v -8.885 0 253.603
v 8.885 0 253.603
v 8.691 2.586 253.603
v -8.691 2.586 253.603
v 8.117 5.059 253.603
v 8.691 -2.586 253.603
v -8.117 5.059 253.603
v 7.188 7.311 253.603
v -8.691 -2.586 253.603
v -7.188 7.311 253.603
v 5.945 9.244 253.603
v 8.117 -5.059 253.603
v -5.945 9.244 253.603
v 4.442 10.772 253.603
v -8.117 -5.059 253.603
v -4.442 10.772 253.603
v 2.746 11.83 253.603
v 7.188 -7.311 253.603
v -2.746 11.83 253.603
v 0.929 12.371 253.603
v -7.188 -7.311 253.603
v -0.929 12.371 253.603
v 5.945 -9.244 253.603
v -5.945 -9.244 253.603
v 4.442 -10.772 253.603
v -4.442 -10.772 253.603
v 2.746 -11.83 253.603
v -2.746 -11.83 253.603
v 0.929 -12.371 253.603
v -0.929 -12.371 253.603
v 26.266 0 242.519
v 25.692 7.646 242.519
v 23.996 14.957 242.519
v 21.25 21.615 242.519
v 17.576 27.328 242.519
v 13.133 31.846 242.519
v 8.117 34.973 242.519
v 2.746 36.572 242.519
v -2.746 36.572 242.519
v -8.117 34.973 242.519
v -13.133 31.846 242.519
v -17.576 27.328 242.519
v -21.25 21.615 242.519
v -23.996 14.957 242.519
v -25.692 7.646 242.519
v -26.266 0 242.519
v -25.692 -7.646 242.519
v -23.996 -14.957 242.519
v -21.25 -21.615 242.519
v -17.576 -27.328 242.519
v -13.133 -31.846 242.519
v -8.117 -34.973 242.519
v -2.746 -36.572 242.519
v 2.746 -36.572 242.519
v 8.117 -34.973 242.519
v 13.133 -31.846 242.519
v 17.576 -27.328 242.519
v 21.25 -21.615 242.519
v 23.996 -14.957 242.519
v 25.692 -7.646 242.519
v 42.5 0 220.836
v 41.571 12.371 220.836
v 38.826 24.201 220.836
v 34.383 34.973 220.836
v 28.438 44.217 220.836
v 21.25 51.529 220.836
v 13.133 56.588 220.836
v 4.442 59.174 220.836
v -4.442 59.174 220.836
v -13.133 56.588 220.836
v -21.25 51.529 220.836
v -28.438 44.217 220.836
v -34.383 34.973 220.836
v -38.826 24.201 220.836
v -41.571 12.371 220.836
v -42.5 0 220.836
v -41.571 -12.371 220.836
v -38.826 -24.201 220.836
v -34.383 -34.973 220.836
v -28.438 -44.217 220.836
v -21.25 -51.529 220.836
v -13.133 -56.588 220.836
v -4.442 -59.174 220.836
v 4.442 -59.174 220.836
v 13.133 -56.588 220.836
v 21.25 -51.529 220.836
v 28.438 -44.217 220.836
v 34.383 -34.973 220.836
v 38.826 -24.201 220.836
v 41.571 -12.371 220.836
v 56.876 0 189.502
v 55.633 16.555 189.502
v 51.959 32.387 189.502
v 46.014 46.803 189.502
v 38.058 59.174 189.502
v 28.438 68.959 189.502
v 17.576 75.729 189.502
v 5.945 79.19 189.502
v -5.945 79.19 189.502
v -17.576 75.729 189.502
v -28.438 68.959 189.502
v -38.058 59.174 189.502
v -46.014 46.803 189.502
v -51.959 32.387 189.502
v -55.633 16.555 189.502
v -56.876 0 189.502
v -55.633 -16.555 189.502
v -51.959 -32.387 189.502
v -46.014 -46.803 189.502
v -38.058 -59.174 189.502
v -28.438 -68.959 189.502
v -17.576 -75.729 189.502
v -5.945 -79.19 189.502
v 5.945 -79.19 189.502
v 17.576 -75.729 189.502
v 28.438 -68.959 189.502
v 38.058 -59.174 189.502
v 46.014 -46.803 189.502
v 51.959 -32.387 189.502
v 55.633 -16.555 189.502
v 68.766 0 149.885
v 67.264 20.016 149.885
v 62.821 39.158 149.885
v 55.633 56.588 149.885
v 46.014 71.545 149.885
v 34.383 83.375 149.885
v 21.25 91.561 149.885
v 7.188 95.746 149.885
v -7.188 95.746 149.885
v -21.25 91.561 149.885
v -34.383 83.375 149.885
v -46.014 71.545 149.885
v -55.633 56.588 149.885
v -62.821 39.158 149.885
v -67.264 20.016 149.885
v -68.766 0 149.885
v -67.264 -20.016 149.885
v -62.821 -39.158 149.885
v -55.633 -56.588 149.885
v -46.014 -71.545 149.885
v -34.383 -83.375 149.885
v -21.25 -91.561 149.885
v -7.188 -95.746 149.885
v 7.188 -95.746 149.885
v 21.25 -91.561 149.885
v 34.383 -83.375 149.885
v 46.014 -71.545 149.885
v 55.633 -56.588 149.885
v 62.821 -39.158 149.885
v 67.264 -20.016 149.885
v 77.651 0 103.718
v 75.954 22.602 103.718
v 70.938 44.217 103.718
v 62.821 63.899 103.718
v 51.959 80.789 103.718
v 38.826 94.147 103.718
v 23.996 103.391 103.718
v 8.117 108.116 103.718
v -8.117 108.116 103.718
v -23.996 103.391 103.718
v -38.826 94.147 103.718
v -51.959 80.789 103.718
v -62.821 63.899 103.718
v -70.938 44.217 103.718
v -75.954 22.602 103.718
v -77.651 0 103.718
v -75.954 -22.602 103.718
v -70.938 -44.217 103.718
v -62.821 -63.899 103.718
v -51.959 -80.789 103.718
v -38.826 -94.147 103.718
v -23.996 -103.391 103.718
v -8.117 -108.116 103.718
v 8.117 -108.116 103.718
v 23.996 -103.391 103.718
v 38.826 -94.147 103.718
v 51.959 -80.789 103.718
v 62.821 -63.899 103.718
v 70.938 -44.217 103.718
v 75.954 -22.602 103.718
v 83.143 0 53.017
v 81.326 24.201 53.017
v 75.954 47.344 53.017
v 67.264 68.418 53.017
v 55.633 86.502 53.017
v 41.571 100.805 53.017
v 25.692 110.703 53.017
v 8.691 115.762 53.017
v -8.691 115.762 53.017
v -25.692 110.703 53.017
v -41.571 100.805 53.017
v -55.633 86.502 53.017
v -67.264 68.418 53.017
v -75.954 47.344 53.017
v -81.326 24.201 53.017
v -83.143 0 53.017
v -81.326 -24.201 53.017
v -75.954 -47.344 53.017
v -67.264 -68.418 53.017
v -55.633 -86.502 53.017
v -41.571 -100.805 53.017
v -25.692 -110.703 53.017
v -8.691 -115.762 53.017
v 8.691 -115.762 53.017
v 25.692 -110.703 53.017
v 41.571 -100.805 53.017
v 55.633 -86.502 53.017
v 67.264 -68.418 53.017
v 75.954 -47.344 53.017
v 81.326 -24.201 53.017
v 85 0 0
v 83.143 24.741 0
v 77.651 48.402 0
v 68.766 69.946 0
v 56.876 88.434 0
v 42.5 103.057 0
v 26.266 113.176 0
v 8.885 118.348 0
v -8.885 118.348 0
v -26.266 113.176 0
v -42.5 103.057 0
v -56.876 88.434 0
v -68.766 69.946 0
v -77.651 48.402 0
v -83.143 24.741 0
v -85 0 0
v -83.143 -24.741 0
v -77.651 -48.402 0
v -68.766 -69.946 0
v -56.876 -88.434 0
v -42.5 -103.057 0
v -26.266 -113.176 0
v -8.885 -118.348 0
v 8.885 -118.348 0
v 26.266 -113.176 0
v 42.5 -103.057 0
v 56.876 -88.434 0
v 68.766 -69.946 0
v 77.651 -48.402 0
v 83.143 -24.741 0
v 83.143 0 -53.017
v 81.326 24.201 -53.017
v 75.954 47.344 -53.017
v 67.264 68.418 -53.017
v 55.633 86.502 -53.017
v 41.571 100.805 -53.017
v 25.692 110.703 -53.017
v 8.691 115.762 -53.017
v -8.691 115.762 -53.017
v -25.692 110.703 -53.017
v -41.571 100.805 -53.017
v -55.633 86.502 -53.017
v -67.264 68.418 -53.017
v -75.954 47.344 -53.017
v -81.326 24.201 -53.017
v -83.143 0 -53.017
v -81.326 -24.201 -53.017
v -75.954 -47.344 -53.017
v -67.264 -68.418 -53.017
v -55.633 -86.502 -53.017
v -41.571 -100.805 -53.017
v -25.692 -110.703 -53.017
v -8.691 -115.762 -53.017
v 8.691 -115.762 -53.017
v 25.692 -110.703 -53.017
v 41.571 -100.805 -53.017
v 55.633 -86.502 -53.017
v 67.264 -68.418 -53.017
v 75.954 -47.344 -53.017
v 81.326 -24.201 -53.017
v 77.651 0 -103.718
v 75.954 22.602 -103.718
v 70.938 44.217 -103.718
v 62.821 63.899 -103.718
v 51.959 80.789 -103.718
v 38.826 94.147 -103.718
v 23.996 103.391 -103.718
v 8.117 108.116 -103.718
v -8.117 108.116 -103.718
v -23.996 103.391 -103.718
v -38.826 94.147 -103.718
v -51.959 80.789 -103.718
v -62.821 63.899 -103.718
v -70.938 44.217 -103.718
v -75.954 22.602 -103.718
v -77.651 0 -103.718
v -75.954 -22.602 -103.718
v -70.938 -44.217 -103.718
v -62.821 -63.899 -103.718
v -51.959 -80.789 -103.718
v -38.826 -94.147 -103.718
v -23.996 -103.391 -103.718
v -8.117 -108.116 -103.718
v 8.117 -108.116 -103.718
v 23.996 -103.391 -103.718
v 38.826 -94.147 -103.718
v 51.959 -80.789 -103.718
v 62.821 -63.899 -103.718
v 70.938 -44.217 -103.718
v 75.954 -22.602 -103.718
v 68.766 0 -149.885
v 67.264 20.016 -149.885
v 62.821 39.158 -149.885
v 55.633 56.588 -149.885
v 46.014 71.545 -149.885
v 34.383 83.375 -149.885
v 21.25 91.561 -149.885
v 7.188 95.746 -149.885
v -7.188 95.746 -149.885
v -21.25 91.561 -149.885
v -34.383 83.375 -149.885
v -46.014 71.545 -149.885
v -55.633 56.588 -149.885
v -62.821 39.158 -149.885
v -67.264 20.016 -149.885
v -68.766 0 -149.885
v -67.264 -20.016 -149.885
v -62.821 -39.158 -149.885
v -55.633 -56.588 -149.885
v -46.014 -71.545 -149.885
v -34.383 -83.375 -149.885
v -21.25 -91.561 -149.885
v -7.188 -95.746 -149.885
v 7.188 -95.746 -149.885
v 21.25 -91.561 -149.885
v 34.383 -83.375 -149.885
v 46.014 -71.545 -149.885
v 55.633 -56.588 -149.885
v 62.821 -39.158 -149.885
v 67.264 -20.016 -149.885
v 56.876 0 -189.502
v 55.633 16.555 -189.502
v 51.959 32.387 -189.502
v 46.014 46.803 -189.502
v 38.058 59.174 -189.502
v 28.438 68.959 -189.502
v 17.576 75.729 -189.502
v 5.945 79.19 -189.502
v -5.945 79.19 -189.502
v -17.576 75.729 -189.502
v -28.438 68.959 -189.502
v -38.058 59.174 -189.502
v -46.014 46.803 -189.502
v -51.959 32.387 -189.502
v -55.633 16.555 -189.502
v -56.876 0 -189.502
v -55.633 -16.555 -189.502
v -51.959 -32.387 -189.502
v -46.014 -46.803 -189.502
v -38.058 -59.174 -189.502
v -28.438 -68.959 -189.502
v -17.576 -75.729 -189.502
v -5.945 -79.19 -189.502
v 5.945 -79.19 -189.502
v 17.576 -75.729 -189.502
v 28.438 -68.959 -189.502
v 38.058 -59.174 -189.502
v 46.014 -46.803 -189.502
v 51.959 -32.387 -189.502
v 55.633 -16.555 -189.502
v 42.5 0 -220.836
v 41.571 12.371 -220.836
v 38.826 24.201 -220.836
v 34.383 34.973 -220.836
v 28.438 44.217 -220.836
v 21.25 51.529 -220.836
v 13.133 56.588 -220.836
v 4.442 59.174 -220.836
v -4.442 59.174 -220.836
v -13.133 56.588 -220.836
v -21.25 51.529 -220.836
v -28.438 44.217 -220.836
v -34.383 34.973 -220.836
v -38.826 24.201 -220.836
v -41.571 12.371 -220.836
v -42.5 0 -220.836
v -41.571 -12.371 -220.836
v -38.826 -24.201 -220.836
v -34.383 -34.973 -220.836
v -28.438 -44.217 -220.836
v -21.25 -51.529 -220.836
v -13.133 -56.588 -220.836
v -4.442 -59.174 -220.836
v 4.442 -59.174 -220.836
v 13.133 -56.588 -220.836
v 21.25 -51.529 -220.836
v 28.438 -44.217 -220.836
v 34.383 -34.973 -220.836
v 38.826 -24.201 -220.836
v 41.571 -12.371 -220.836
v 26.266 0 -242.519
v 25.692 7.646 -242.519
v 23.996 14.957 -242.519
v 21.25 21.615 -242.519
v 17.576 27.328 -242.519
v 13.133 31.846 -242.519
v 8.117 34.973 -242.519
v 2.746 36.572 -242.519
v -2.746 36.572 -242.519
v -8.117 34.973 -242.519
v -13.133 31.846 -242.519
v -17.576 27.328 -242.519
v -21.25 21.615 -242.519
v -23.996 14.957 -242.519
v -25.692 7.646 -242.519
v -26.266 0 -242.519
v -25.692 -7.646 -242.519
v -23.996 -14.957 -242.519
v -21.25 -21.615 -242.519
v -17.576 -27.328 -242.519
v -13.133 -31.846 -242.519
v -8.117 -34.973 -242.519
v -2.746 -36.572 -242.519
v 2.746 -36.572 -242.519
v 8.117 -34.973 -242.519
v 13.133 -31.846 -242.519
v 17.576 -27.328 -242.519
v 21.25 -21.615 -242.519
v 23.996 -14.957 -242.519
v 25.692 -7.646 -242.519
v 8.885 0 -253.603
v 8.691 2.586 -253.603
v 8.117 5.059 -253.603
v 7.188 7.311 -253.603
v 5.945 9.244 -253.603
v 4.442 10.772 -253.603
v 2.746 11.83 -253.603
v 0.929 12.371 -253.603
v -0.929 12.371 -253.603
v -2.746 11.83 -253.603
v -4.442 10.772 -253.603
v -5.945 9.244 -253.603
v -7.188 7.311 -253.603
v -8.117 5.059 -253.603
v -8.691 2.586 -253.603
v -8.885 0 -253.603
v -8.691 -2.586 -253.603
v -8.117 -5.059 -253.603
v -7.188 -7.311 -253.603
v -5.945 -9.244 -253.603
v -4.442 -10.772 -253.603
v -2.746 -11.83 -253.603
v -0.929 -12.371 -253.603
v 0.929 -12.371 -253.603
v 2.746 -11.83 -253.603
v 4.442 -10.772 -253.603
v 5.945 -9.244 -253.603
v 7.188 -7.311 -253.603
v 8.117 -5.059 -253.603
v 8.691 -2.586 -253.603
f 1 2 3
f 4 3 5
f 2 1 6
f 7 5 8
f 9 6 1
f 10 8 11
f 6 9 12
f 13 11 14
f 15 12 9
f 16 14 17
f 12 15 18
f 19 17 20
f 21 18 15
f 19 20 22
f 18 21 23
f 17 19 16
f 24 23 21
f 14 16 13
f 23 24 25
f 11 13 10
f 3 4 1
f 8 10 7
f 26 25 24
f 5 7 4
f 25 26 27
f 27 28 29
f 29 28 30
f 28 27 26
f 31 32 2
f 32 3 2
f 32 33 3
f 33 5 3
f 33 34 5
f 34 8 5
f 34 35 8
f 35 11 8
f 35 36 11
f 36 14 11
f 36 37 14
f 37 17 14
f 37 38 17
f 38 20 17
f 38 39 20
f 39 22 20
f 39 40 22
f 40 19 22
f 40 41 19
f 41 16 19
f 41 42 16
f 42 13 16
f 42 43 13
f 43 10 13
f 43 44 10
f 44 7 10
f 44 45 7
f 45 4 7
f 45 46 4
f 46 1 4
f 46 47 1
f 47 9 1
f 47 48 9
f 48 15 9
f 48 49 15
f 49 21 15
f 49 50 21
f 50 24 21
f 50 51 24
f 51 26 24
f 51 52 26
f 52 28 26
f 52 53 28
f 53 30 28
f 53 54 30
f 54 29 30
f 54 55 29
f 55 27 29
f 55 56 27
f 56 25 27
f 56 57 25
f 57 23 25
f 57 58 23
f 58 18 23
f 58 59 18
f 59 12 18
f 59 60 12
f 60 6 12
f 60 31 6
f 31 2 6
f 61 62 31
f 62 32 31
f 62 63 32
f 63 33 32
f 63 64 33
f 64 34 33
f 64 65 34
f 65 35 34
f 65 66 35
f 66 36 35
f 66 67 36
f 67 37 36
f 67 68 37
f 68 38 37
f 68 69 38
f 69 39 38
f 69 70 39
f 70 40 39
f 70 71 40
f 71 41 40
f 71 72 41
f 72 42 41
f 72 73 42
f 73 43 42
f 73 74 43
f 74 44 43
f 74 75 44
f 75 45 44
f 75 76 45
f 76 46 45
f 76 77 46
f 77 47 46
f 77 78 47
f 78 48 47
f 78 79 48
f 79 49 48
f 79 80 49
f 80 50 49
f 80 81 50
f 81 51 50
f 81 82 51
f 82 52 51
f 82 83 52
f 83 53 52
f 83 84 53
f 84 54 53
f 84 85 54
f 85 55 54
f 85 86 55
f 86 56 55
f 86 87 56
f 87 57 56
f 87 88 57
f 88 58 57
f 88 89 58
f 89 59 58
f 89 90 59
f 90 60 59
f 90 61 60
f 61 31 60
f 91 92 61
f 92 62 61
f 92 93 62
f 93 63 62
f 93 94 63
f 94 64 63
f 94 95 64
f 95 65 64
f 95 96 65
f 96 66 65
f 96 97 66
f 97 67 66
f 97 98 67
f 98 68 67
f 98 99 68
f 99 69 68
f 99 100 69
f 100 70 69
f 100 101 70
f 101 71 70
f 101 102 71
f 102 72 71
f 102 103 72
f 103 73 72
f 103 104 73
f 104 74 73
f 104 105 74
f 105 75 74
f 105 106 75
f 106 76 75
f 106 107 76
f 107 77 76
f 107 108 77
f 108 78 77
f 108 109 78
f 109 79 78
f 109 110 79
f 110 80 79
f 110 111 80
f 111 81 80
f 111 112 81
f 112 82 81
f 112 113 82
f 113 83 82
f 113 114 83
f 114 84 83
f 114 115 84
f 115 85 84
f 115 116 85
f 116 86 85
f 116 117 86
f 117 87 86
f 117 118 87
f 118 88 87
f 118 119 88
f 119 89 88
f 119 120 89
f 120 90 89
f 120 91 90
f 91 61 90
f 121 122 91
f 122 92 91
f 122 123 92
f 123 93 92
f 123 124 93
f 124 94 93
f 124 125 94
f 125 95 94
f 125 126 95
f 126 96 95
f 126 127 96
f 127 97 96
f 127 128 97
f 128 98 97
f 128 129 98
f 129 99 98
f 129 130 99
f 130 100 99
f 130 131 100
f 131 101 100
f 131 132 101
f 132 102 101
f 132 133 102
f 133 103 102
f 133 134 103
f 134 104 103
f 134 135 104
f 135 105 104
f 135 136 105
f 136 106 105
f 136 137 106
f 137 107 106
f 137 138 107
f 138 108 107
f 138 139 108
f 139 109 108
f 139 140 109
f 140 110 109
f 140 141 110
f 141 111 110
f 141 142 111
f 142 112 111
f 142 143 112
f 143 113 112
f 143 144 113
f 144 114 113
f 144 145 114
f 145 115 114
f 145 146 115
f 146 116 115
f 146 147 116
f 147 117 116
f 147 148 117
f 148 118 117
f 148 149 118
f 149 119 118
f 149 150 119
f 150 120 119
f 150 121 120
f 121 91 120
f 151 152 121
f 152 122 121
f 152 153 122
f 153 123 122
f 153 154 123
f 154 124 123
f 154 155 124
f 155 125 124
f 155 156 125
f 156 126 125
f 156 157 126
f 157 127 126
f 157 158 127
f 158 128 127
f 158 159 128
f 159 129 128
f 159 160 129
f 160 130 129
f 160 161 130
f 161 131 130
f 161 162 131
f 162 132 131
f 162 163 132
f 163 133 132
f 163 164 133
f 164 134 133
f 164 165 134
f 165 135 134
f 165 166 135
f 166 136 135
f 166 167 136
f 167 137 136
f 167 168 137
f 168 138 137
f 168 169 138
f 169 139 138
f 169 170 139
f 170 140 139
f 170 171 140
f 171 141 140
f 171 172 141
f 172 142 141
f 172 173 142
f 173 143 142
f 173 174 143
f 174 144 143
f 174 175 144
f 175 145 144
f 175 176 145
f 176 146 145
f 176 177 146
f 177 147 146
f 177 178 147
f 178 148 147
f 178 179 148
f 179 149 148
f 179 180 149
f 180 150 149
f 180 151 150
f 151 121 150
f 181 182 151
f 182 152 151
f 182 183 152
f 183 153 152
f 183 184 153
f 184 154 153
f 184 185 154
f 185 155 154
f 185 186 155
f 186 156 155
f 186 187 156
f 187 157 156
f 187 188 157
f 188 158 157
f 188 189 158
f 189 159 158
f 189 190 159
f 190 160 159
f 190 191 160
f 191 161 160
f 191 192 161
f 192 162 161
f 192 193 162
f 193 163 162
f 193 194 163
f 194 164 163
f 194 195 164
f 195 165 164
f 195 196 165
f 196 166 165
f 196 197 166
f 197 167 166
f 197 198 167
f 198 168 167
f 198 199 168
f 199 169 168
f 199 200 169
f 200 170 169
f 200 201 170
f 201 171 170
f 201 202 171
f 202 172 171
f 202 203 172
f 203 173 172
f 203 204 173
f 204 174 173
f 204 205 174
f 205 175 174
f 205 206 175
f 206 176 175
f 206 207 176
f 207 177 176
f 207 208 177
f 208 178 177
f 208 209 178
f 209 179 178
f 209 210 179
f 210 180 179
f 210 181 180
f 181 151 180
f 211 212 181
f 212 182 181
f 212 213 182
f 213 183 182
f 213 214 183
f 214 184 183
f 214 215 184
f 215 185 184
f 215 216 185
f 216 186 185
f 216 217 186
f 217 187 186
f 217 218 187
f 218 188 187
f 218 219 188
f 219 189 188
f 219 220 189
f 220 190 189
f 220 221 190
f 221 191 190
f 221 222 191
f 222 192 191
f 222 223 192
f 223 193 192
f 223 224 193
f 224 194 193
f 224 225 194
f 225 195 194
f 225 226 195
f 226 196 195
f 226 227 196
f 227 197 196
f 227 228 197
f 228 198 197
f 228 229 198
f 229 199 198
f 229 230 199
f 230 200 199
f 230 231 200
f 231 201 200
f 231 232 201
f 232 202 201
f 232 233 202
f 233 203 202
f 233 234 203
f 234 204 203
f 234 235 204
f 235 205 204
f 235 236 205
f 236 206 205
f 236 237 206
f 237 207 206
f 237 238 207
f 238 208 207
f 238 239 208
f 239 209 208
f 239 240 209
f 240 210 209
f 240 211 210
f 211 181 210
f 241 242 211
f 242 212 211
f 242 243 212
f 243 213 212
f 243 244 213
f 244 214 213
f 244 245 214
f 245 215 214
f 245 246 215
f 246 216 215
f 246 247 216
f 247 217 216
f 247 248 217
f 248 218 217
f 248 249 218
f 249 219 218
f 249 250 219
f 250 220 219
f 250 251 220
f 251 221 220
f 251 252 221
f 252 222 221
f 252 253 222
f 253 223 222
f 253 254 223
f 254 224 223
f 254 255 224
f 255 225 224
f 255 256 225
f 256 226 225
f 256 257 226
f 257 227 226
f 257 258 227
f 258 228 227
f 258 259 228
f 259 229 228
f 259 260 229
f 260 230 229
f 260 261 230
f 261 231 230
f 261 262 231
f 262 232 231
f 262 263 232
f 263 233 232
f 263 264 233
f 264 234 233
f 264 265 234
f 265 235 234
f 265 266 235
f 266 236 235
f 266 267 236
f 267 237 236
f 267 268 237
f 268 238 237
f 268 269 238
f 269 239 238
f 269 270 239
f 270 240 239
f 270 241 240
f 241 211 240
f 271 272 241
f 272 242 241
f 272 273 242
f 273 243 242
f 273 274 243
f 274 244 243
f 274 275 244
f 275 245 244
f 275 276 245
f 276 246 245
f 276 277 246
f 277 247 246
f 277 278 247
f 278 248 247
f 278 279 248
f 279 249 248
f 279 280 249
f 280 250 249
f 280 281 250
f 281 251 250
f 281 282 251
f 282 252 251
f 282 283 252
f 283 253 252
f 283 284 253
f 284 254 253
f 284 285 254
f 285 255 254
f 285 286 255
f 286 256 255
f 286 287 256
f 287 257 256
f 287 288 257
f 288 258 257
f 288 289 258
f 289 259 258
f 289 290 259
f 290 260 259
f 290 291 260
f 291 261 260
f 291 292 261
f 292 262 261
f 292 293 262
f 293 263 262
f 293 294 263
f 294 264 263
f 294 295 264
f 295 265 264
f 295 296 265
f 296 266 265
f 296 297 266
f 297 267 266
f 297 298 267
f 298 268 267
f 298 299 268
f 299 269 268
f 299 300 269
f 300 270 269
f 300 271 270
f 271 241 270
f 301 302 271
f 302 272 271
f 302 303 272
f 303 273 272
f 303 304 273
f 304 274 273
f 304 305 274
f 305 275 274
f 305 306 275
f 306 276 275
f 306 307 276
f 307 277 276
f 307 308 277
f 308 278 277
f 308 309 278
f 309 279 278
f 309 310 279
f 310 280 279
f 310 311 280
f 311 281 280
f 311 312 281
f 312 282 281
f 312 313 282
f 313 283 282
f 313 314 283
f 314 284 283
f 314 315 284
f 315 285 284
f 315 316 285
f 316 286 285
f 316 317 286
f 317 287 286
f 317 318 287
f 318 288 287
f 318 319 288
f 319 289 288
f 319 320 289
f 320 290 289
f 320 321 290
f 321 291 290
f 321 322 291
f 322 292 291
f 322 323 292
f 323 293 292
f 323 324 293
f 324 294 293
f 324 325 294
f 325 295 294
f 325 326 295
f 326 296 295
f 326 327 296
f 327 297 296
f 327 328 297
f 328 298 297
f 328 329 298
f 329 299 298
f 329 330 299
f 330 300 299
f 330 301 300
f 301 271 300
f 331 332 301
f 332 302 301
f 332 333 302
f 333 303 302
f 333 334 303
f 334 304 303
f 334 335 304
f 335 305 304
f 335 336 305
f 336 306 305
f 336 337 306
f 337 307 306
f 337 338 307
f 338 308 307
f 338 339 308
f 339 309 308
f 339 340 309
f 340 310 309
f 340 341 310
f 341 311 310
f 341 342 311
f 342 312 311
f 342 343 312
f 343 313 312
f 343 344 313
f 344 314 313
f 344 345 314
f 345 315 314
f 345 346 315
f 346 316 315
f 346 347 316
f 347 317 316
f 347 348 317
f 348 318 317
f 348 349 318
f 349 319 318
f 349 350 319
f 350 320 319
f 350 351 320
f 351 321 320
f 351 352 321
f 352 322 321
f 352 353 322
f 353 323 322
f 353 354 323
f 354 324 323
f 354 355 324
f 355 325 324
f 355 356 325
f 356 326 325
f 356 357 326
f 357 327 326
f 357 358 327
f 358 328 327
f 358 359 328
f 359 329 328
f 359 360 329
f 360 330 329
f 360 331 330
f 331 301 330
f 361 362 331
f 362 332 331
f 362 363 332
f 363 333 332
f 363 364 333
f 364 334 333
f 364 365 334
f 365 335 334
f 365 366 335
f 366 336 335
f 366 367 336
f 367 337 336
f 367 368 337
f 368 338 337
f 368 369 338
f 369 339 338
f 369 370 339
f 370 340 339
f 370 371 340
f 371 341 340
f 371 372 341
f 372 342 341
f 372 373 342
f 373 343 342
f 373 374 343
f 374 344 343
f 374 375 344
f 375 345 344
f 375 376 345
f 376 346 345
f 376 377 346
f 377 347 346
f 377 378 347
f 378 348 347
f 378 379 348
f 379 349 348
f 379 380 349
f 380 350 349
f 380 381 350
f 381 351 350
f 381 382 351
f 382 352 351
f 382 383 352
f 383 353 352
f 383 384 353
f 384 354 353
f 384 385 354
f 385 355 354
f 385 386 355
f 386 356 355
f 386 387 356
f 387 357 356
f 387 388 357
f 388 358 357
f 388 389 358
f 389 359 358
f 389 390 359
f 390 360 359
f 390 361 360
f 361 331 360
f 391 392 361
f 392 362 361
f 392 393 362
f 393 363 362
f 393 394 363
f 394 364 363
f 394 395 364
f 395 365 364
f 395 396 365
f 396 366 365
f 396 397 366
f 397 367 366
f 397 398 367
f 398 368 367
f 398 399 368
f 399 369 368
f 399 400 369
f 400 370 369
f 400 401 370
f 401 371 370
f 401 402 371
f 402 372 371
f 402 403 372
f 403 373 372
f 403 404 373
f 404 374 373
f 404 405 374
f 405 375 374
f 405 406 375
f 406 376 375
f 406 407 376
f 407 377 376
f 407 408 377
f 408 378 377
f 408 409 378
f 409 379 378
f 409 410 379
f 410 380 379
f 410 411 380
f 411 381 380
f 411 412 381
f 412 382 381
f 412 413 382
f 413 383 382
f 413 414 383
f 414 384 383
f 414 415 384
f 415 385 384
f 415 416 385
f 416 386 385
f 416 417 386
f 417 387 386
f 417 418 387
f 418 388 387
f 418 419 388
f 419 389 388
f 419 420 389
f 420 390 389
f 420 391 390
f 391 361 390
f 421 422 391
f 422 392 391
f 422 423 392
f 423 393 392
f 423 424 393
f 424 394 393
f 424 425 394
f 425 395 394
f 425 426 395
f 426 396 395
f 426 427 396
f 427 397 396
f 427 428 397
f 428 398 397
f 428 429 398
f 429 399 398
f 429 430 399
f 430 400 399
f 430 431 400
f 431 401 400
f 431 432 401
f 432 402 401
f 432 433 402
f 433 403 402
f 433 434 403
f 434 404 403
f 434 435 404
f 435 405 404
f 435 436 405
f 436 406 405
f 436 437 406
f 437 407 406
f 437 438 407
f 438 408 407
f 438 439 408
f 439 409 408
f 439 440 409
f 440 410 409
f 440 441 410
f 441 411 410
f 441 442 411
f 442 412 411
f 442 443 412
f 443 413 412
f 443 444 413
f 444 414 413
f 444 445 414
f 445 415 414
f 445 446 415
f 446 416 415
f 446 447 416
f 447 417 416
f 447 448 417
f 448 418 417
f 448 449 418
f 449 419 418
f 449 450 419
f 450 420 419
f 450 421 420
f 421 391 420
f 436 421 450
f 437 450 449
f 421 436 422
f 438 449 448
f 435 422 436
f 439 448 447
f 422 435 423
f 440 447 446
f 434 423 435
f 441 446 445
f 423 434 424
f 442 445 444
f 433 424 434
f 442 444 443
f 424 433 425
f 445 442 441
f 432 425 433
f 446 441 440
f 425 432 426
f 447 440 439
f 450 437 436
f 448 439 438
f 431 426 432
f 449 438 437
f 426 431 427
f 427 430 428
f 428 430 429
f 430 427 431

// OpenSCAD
// Generated by SolidPython 1.0.1 on 2020-07-29 00:46:46


scale(v = [5, 7, 15]) {
	sphere(r = 17);
}
/***********************************************
*********      SolidPython code:      **********
************************************************
 
# import packages: SolidPython
from solid import *
from solid.utils import *
from itertools import chain, combinations, permutations


class Resize:

    def __init__(self, scad_file):
        self.scad_file = scad_file
        #self.scad_file = import_scad(scad_file)
        # cone/cylinder param:
        self.r1 = 0
        self.r2 = 0
        self.h = 0
        # rectangular prism param:
        self.w = 0
        self.l = 0
        # ellipse param:
        self.r = 0

    # import OpenScad code (file name corresponds to shape)


    # classify shape + parameters
    def assign(self, param1, param2, param3):
        if self.scad_file == 'cone.scad':
            self.r1 = param1
            self.r2 = param2
            self.h = param3
        elif self.scad_file == 'cylinder.scad':
            self.r1 = param1
            self.r2 = param2
            self.h = param3
        elif self.scad_file == 'rectangularPrism.scad':
            self.h = param1
            self.l = param2
            self.w = param3
        else:
            self.r = param1
            self.h = param2

    # resize parameters
    def iterate(self):
        x = range(3, 20, 2)
        i = 1
        if self.scad_file == 'cone.scad':
            tempList = list(permutations(x, 2))
            for temp in tempList:
                param1 = temp[0]
                param2 = temp[1]
                filepath = 'produced_scad_files/' + 'cone' + str(param1) + '_' + str(param2) + '_' + '.scad'
                scad_render_to_file(cylinder(h=param1, r1=param2, r2=0), filepath)

        elif self.scad_file == 'cylinder.scad':
            tempList = list(permutations(x, 3))
            for temp in tempList:
                param1 = temp[0]
                param2 = temp[1]
                filepath = 'produced_scad_files/' + 'cylinder' + str(param1) + '_' + str(param2) + '_' + '.scad'
                scad_render_to_file(cylinder(h=param1, r1=param2, r2=param2), filepath)

        elif self.scad_file == 'rectangularPrism.scad':
            tempList = list(permutations(x, 3))
            for temp in tempList:
                param1 = temp[0]
                param2 = temp[1]
                param3 = temp[2]
                filepath = 'produced_scad_files/' + 'rectangularPrism' + str(param1) + '_' + str(param2) + '_' + str(
                    param3) + '.scad'
                scad_render_to_file(cube(size=(param1, param2, param3)), filepath)

        elif self.scad_file == 'ellipse.scad':
            tempList = list(permutations(x, 4))
            for temp in tempList:
                param1 = temp[0]
                param2 = temp[1]
                param3 = temp[2]
                param4 = temp[3]
                filepath = 'produced_scad_files/' + 'ellipse' + str(param1) + '_' + str(param2) + '_' + str(param3) + '_' + str(param4) + '.scad'
                scad_render_to_file(scale([param1, param2, param3])(sphere(r=param4)), filepath)

    def render_to_scadfile(self):
        scad_render_to_file(scad, 'example.scad') 
 
************************************************/
